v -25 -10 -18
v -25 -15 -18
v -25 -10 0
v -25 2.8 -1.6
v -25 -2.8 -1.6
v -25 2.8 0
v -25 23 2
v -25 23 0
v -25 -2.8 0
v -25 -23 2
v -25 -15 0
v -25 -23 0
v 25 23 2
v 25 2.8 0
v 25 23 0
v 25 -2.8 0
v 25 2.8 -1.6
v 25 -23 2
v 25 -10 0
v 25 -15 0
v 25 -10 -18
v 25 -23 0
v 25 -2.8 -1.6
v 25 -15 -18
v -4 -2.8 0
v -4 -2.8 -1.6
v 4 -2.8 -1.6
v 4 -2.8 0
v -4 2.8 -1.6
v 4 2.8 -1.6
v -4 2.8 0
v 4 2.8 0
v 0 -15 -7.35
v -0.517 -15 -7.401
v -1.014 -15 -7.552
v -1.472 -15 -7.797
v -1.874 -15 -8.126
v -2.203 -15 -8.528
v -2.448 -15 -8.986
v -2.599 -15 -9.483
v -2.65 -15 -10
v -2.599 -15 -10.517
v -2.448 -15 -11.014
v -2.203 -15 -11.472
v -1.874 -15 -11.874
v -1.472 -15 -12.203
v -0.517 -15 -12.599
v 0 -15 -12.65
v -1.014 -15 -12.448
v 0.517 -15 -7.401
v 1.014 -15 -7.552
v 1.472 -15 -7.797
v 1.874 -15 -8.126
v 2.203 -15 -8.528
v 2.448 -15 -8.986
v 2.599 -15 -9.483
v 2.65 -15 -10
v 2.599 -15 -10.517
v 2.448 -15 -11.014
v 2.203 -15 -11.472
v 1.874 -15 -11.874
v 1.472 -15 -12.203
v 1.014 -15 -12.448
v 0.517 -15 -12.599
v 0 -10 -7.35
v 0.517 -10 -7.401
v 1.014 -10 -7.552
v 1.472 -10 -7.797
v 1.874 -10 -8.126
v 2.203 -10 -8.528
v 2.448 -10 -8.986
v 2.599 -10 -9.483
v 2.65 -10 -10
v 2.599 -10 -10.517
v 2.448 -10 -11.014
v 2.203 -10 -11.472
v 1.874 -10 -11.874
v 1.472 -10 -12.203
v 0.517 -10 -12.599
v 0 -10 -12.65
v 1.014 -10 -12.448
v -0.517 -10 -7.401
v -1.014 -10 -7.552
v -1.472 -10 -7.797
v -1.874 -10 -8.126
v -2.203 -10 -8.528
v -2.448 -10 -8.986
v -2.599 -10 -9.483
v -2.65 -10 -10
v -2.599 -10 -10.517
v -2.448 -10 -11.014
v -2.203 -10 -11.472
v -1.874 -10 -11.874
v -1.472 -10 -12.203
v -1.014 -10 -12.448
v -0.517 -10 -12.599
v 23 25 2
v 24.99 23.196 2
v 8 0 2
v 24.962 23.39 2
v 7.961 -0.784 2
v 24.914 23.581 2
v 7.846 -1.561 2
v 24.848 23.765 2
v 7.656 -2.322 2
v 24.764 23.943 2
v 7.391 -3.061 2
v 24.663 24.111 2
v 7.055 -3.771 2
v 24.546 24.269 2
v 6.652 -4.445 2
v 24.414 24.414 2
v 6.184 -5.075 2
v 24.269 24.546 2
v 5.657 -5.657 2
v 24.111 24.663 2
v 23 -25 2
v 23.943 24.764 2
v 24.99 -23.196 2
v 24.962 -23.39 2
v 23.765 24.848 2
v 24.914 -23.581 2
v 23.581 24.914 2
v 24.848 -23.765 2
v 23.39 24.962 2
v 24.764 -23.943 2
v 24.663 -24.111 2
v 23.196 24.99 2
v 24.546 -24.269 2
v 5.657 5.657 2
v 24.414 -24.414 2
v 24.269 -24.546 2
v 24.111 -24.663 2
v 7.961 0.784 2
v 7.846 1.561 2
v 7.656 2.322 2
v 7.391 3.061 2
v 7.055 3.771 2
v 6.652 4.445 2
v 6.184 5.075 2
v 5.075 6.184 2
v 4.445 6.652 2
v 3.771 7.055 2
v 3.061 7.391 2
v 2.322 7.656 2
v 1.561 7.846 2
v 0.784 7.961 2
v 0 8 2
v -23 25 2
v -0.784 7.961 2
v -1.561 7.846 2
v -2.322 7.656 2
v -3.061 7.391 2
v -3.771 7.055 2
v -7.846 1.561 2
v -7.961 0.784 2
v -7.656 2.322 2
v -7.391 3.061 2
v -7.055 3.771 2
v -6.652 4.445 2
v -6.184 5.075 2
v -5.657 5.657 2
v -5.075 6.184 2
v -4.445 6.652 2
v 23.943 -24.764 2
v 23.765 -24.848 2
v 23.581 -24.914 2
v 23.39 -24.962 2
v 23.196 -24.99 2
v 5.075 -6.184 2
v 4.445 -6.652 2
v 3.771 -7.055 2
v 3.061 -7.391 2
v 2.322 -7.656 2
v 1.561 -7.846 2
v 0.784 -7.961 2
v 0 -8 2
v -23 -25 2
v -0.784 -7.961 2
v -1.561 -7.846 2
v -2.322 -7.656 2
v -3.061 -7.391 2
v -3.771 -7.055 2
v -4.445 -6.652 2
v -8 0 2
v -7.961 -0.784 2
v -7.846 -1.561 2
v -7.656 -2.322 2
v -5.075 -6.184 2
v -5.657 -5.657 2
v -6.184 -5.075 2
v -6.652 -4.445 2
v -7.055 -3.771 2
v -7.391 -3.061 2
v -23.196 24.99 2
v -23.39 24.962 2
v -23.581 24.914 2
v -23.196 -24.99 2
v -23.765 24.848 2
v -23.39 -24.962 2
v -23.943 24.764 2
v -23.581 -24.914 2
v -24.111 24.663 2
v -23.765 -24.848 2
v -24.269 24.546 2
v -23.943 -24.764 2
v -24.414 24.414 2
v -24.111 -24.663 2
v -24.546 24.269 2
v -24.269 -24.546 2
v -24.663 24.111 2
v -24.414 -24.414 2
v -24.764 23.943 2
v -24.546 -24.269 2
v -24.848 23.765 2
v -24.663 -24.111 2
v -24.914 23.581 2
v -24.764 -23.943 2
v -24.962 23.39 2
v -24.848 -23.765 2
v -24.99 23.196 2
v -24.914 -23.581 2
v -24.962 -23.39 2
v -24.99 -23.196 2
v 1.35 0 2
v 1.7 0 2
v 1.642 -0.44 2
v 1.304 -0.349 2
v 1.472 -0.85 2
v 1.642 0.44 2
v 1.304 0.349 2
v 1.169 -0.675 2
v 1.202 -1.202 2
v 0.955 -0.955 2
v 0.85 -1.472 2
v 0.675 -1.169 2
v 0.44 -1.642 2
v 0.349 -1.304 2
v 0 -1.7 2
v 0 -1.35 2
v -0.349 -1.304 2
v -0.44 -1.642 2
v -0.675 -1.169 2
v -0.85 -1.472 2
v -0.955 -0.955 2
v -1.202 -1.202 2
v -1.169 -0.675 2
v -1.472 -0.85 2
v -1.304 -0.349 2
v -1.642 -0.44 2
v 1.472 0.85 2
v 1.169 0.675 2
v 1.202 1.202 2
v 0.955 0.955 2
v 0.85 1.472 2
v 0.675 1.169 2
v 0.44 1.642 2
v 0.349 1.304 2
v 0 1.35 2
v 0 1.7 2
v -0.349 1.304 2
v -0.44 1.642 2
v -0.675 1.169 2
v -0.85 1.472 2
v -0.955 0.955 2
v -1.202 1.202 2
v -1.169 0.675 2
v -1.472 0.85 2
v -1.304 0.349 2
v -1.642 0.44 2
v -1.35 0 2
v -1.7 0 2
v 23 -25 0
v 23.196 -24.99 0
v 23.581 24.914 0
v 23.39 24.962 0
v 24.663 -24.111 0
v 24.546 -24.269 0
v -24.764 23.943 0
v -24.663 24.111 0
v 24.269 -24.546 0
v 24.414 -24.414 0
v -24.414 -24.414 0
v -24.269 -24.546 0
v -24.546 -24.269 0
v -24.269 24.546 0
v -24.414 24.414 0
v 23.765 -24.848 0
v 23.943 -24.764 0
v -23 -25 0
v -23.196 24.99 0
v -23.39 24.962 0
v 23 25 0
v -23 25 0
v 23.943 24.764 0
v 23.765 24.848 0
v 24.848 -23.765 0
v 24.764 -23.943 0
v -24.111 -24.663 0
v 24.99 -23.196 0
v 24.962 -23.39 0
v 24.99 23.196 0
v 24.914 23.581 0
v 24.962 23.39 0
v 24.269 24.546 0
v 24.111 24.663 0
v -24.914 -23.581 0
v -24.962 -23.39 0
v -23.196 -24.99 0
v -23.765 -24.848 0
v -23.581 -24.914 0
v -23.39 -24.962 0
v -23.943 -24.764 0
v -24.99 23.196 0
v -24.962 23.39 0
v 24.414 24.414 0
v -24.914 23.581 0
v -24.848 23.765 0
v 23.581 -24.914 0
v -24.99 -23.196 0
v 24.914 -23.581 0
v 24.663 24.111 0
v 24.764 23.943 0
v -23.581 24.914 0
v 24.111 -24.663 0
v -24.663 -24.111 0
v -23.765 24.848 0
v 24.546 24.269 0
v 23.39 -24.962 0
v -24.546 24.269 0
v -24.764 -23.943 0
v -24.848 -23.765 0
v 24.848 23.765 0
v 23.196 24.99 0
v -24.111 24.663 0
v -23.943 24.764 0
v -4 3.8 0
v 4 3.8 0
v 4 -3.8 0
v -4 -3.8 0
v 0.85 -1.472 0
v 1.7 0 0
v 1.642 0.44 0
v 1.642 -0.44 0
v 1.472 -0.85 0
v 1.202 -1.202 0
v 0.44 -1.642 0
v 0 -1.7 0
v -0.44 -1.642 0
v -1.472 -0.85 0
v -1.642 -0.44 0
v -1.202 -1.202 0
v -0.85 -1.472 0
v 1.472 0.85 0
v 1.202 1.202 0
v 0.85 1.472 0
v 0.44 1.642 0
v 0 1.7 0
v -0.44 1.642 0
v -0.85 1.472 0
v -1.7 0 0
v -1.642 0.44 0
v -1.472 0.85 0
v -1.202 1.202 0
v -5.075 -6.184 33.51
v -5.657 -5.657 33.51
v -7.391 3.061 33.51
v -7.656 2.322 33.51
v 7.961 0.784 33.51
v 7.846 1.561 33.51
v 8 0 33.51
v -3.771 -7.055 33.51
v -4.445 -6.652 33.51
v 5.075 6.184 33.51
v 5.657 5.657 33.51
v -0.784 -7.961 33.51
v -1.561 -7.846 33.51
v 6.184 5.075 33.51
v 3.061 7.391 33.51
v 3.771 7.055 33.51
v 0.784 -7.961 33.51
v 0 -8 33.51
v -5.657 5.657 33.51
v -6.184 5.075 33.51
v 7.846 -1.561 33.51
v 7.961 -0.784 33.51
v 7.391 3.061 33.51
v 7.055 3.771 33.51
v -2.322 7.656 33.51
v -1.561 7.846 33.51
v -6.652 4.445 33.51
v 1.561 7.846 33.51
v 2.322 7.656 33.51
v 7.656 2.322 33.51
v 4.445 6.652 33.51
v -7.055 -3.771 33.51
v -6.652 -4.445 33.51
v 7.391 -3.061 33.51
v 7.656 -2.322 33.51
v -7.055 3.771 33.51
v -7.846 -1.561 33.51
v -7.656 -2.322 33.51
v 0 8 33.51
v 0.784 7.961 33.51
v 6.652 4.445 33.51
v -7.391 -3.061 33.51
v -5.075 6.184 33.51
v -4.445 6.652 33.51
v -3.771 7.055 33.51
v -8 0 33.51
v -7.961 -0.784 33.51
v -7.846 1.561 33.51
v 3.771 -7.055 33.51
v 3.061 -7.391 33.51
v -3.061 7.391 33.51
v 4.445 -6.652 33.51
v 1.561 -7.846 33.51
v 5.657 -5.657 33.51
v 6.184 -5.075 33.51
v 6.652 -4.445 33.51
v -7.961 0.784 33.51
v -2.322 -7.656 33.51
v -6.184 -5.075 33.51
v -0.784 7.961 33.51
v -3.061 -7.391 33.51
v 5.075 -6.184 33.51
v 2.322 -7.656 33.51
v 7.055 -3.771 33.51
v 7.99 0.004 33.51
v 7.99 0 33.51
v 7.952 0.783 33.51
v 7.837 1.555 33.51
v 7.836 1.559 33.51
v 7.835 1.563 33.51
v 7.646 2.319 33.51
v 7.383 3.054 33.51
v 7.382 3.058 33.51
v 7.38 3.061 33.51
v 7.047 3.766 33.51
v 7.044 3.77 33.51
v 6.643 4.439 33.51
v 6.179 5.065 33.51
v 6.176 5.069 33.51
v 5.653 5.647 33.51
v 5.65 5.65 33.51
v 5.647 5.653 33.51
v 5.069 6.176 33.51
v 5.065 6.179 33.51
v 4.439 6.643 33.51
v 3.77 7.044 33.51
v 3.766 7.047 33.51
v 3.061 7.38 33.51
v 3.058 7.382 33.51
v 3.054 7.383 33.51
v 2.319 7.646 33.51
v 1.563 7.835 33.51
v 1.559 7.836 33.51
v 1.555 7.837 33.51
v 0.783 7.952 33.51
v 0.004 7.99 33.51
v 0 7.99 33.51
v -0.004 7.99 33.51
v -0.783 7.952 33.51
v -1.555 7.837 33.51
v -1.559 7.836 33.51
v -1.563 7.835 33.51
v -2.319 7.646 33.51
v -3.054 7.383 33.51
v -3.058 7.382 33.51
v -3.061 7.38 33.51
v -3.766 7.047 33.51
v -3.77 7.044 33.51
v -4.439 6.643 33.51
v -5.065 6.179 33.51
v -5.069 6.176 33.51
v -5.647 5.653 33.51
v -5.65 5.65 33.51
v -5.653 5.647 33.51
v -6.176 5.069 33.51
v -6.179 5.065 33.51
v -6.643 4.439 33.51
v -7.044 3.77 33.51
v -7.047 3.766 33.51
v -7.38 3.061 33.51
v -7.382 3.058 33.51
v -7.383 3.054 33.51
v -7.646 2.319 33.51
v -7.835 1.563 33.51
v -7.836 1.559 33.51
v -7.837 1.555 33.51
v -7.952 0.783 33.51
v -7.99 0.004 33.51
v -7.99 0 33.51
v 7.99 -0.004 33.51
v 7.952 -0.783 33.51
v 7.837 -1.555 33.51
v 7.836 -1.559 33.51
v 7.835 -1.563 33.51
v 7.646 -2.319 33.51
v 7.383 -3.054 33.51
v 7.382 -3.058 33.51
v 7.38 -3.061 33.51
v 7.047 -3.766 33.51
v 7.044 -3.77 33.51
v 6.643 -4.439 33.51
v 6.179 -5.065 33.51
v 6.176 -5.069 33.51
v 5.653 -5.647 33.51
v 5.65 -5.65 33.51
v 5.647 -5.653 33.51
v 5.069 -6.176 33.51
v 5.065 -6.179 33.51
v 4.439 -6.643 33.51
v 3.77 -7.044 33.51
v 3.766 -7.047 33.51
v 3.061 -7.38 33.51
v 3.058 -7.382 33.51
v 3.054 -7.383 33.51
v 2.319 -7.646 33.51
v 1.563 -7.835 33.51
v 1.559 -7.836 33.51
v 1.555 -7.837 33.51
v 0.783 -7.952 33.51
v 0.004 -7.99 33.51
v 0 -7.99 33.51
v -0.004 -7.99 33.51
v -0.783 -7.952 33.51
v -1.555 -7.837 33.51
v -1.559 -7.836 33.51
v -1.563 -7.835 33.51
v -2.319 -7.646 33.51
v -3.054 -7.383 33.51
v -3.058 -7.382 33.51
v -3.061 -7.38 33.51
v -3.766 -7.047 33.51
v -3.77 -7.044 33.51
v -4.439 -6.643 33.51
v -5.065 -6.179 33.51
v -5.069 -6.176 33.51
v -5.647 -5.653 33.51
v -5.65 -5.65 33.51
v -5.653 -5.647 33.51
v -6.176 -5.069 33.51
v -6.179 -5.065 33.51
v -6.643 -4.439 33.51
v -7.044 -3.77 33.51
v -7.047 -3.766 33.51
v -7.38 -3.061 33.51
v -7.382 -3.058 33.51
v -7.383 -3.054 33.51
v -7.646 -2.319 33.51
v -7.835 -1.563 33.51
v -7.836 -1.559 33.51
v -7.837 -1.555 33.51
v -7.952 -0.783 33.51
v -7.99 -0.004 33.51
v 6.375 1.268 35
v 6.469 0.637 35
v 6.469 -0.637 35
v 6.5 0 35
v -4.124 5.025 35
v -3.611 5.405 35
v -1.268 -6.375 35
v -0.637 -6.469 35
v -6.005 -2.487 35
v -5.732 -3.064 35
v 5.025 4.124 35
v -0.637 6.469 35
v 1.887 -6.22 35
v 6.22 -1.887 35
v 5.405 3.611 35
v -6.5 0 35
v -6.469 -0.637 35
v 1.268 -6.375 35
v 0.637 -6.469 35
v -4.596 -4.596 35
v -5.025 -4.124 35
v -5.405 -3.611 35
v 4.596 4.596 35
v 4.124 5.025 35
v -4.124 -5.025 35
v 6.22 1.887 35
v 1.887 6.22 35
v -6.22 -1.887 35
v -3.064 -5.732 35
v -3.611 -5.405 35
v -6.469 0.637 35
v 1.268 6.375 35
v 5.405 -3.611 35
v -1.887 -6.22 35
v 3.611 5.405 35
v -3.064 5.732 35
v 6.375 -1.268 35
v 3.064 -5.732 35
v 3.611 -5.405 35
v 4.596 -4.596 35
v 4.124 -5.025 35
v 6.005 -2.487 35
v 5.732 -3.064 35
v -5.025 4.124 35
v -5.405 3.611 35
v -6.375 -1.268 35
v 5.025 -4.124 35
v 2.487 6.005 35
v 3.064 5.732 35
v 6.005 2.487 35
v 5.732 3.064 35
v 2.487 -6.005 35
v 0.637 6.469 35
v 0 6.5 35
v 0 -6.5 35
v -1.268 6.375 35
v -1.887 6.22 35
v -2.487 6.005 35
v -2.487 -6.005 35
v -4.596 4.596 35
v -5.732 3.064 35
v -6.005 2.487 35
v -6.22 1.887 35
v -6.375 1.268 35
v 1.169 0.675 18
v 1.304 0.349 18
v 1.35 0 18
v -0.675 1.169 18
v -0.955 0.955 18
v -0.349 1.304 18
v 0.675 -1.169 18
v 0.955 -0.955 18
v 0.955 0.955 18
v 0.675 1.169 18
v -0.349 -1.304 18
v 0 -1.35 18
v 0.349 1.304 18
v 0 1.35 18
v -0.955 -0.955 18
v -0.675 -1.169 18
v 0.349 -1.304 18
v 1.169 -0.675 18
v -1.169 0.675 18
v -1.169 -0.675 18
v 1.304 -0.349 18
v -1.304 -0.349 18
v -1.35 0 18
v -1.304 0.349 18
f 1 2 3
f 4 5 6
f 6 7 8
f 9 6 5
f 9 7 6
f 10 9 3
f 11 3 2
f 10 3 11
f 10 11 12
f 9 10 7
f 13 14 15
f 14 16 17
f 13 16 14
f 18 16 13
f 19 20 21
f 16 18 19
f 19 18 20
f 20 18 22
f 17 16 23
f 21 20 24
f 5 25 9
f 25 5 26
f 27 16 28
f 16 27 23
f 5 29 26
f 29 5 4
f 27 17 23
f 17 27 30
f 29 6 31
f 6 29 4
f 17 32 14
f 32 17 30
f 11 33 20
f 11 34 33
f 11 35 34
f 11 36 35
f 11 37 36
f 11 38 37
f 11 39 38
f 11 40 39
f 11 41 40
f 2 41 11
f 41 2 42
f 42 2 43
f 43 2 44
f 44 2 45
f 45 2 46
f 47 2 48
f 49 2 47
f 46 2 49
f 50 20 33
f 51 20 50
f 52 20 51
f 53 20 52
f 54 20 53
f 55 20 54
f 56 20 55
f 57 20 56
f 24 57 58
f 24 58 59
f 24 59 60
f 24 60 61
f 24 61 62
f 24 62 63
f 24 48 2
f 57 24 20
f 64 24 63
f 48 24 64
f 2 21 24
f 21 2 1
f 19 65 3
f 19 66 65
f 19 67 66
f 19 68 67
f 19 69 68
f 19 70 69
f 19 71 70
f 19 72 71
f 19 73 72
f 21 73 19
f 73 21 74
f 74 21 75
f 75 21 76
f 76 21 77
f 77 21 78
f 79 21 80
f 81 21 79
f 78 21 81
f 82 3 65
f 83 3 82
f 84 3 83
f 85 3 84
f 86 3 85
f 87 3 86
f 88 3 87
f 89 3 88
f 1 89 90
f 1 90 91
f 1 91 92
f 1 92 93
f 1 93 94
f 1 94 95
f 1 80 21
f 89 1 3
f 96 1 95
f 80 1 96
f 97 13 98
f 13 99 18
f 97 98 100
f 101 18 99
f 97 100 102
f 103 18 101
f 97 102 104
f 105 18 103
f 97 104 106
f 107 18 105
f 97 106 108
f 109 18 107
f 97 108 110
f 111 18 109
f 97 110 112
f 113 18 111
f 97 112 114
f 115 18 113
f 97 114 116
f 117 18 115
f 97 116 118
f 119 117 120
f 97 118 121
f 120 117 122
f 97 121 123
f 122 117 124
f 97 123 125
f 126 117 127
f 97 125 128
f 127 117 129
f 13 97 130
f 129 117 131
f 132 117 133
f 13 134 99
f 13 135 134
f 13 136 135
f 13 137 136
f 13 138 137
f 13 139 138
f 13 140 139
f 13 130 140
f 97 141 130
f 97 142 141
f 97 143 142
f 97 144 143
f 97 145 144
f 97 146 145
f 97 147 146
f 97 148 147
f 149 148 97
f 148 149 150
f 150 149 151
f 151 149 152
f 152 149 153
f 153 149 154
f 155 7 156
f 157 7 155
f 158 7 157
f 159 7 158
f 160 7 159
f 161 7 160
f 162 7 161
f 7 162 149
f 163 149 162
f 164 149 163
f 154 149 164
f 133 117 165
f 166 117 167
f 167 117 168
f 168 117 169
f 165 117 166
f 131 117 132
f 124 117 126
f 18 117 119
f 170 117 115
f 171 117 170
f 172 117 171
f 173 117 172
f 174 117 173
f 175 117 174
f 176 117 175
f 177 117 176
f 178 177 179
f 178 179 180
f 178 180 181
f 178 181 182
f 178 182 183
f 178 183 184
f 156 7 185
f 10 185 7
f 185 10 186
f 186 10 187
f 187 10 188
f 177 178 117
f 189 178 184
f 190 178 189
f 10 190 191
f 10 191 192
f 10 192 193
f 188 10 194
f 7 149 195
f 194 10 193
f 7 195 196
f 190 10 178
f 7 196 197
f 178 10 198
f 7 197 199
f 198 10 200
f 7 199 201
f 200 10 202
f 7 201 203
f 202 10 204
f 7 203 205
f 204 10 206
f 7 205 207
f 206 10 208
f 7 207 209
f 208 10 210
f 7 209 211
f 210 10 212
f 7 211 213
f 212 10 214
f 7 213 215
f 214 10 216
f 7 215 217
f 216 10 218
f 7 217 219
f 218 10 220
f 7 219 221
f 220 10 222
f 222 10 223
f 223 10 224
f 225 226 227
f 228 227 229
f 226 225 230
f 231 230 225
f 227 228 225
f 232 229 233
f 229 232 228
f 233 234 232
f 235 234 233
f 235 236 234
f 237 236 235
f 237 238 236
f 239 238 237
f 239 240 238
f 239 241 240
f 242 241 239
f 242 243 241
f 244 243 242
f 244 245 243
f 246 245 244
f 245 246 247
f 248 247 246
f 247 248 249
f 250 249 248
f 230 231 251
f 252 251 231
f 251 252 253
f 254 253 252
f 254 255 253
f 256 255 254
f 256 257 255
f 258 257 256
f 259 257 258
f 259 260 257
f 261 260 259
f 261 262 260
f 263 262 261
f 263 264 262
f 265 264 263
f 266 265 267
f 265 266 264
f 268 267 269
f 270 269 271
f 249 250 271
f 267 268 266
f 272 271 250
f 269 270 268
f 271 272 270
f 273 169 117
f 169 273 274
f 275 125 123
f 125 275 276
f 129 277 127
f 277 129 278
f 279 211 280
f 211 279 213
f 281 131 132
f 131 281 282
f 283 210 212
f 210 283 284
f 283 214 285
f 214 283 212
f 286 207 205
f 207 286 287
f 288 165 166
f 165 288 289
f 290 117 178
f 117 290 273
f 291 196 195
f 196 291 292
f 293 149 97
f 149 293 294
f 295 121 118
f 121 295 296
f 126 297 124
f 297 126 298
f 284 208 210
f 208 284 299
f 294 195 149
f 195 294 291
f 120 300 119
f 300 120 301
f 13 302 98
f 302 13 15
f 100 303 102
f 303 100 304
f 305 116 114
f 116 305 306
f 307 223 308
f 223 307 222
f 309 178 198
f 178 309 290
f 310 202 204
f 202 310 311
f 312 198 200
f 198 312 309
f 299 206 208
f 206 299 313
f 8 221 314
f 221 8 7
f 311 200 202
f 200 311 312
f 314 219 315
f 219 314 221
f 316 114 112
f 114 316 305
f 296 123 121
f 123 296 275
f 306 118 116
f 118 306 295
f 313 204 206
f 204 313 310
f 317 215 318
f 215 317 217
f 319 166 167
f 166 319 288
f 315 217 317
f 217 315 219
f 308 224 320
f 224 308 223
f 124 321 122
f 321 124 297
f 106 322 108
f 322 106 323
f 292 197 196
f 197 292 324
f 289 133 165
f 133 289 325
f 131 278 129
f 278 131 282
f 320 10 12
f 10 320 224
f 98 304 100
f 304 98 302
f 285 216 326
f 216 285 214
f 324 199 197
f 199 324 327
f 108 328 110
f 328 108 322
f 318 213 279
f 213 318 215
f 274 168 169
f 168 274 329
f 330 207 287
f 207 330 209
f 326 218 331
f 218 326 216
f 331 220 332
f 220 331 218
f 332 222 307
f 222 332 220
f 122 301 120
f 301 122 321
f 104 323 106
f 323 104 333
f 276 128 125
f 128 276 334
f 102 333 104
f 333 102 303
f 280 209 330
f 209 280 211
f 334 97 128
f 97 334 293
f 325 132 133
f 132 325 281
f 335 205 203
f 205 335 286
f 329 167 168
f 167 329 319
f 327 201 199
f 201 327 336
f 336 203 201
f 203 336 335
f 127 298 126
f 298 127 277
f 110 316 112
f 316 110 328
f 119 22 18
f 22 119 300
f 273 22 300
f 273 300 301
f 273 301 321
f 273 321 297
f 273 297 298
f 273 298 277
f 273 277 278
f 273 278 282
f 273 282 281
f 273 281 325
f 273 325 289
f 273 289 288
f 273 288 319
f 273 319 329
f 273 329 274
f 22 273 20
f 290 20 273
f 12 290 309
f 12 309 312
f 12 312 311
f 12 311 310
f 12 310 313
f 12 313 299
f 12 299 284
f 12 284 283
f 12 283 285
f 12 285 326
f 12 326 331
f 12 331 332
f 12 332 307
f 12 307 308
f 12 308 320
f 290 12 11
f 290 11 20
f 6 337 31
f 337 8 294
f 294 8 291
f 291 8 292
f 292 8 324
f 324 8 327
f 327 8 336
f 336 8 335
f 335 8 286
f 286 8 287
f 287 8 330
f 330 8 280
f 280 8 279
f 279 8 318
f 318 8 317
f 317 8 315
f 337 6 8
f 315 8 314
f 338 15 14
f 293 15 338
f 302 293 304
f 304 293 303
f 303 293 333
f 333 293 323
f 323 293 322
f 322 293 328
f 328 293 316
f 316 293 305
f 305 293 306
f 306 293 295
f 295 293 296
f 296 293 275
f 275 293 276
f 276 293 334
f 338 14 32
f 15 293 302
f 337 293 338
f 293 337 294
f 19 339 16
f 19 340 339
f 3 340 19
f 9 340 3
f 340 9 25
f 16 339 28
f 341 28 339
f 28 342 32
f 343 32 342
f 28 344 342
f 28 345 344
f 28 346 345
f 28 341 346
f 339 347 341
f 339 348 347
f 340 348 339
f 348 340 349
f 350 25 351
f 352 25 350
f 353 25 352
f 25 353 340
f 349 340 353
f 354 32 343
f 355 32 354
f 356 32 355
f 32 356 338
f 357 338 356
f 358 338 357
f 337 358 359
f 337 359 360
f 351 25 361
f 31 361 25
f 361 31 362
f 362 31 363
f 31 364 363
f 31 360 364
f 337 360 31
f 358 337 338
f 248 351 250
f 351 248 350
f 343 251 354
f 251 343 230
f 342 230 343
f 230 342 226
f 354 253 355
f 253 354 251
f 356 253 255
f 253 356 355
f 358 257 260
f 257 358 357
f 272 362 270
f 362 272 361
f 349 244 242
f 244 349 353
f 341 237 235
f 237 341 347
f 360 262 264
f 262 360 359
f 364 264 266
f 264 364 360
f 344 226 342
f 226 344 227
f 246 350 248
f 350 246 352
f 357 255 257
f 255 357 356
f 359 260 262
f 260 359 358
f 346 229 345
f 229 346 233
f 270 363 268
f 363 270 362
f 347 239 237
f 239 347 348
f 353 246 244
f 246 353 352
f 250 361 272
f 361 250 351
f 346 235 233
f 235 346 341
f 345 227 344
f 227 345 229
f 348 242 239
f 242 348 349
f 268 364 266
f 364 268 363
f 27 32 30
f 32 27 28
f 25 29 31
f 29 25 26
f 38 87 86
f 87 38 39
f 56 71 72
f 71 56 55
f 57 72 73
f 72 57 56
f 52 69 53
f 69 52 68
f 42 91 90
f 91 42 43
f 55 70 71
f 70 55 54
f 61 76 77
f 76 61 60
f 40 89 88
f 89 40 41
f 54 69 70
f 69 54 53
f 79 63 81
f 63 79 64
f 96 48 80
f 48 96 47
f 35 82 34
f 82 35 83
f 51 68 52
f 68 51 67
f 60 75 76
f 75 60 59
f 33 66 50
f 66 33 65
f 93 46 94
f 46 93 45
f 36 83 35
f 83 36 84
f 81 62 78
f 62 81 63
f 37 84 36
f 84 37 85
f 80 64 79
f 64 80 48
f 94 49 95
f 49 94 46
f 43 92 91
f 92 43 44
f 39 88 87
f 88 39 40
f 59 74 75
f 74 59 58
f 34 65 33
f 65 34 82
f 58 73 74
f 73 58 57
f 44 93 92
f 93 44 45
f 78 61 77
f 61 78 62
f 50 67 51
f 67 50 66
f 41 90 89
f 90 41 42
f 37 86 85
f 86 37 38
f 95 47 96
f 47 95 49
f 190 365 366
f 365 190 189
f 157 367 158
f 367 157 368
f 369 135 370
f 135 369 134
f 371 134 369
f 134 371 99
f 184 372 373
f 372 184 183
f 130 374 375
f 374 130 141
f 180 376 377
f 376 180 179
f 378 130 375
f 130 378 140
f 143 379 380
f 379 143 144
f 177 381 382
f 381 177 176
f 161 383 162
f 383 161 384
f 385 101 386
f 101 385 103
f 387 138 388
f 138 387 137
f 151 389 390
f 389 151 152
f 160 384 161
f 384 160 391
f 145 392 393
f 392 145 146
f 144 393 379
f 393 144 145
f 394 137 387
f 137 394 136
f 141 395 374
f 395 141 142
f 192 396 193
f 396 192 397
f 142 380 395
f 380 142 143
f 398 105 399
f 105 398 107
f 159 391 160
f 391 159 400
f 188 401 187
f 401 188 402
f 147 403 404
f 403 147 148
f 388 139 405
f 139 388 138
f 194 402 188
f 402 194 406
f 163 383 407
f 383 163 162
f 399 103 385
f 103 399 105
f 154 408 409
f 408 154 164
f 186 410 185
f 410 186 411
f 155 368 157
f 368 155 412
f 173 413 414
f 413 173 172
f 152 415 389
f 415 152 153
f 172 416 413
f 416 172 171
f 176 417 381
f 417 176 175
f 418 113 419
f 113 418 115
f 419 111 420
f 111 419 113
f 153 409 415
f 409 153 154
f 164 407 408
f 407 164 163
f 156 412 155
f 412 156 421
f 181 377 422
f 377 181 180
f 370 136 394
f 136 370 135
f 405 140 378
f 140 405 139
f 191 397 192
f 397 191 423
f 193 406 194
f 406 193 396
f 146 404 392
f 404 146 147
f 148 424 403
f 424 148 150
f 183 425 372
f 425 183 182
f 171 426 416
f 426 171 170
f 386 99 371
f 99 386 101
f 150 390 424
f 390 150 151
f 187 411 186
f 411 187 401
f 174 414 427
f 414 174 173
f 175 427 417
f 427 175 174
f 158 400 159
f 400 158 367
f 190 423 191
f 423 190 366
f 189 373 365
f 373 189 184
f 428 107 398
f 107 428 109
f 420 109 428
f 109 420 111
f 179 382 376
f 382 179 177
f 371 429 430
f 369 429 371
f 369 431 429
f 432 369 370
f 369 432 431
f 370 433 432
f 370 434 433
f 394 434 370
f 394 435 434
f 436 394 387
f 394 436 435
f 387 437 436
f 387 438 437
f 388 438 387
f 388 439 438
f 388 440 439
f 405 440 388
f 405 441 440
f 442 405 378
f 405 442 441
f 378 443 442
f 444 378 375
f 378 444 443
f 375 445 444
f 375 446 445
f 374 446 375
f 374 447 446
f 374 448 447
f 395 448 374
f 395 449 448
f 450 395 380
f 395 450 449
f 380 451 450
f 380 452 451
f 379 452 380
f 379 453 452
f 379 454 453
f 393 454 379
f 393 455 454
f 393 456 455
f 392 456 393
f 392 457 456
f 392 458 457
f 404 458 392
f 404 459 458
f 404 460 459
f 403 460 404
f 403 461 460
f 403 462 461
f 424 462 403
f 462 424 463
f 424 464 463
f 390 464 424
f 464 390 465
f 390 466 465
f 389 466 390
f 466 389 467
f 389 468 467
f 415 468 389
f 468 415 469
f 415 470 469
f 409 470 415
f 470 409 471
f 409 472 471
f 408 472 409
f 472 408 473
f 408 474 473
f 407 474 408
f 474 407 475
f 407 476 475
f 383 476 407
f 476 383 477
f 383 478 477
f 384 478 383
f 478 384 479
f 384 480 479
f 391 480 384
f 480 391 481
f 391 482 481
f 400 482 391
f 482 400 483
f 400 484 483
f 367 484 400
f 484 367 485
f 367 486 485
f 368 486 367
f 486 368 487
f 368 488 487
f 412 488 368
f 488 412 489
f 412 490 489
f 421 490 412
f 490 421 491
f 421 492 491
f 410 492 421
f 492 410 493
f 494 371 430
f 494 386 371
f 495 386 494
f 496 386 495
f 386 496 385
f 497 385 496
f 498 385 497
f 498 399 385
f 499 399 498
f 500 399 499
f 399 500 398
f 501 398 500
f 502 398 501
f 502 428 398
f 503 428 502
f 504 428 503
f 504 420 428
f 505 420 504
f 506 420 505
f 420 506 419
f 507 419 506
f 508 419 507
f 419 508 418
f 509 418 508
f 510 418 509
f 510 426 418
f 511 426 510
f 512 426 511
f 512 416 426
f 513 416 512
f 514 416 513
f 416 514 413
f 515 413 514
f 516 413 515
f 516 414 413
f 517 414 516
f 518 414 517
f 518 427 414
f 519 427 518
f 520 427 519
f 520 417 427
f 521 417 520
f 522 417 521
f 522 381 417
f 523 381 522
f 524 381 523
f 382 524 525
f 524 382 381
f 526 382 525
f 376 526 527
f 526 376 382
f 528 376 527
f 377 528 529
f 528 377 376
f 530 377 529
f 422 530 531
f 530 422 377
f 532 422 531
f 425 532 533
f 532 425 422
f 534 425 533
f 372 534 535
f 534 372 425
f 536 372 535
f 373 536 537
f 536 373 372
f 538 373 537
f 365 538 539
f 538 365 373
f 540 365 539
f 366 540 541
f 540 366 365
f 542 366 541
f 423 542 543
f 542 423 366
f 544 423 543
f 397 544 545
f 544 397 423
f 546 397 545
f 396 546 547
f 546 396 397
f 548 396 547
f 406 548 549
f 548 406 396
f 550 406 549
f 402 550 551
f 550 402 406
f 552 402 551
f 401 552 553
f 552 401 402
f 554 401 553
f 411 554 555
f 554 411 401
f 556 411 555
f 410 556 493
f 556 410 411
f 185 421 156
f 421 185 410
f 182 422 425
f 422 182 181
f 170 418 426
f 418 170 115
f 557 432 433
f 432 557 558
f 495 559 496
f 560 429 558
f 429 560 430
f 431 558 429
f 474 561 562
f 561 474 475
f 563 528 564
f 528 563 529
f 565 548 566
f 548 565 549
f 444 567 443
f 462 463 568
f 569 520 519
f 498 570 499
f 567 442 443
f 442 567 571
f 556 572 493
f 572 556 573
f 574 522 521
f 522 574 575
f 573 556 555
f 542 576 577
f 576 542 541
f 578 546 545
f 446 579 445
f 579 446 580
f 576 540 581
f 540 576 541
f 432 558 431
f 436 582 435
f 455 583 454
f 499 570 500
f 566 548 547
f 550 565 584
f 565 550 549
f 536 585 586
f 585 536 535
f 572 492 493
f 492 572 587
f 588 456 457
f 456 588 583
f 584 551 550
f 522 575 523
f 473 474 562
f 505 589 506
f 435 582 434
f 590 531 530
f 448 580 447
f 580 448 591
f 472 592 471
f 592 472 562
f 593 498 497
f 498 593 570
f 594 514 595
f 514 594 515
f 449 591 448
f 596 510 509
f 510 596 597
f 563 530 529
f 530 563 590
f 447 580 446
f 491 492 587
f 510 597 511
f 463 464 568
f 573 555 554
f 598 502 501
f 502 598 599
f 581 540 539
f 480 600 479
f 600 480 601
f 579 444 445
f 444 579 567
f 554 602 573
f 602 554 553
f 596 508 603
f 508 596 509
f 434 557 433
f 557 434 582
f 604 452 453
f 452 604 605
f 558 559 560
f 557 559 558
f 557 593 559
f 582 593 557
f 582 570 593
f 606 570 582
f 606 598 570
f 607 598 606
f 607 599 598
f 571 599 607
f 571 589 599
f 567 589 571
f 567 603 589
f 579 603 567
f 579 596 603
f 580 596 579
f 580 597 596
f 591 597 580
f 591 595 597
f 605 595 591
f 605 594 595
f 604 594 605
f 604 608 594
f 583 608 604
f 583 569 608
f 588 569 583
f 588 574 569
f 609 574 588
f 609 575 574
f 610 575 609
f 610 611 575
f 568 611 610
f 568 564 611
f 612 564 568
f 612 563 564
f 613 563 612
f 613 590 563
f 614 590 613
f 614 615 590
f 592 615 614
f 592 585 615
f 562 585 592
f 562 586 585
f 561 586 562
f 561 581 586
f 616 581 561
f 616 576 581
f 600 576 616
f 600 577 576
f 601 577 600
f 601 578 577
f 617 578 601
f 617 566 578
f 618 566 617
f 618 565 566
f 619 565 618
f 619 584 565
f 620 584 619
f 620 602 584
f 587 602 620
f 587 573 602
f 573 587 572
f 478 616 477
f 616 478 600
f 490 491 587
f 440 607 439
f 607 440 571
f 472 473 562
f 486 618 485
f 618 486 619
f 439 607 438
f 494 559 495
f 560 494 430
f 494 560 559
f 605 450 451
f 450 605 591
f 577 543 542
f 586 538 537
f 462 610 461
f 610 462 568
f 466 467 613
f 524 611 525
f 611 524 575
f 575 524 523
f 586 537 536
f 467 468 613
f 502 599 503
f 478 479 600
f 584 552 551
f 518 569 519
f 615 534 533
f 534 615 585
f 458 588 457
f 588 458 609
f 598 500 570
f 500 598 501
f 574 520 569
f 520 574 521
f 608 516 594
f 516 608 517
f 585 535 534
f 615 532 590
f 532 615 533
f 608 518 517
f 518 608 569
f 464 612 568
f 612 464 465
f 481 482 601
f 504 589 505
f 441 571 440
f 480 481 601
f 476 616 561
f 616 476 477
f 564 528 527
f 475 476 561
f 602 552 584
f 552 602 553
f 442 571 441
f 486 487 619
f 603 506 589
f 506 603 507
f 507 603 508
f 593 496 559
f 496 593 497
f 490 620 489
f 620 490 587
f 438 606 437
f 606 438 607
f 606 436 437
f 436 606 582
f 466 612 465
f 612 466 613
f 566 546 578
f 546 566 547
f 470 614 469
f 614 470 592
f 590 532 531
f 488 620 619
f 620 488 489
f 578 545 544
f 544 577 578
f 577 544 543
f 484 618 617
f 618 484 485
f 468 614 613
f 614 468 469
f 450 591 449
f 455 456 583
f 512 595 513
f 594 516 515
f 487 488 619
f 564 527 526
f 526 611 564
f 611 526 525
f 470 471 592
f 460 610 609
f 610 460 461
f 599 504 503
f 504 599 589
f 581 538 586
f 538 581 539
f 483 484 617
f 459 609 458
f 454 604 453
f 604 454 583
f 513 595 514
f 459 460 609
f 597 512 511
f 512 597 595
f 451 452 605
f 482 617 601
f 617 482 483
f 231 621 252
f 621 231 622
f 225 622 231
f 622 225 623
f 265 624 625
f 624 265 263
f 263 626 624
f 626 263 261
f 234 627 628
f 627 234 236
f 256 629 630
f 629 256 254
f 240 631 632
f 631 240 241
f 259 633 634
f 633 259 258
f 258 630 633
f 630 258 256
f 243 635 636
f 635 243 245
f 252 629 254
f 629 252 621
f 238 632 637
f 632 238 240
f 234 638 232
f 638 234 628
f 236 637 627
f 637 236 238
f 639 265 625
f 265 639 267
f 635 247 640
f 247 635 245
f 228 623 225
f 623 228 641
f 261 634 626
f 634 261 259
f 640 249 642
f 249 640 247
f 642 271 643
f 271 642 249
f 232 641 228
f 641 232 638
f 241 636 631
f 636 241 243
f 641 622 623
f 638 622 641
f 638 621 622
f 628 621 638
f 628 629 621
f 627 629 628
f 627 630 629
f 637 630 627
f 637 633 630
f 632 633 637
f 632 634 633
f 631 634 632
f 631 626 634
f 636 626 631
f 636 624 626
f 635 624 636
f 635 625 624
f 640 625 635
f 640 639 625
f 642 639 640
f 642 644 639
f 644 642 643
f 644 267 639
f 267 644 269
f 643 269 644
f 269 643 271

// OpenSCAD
// Washer holder: a place on the V base for the spare 50 x 50 washers (Matt,
// 2026-09-27). A 50 x 50 x 2 plate on top of one of the base's 2020 rails,
// centred over it, with a post for the washers' M16 hole and a leg down the
// rail's side face, M5 x 10 into a drop-in tee nut. The leg runs down from
// under the plate, 10 off its centre, where the rail's side face is. It is
// v-base.scad's angle bracket with a wider pad: the same 5 mm leg, the same
// rib in the top slot's opening to square it. The spares are ballast too,
// wherever on the base they sit.
//
// The plate overhangs the rail 15 a side and is only 2 thick. The washers are
// 5 mm of steel and sit on the rail through it, so the overhang carries
// nothing.
//
// It cannot print in one piece without support: the post goes up from the
// plate and the leg goes down. So two parts (part = bracket | post):
//   bracket - plate, rib and leg. Printed upside down, plate's top on the
//             bed, leg and rib standing. No support.
//   post    - printed as it stands.
// One M3 x 16 cap head up through the plate into a pilot in the post. Its
// head hangs under the plate in the rail's top slot, 5.5 in the 6.0 opening,
// and the rib is cut away round it. The post only locates the washers, so
// the screw carries nothing either. Fit the post before the bracket goes on
// the rail.
//
// part = "whole" is the one piece, no M3. It prints standing on its end, the
// post level, and wants support under the post.
part        = "pair";  // [pair, bracket, post, whole]
rail        = 20;
plate       = [50, 50, 2];   // along the rail, across it, thick
corner_r    = 2;
spares      = 6;       // washers the post holds
washer      = [50, 50, 5];   // load-stack.scad's
post_d      = 16;      // the washers' hole is 17.5 to 18; the stack's M16 bolt is the same 16
post_over   = 3;       // post above a full stack
post_c      = 1.5;     // chamfer at its top
leg_t       = 5;
leg_short   = 2;       // leg stops this far above the desk
m5_clear    = 5.3;
rib_w       = 5.6;     // into the slot's 6.0 opening
rib_h       = 1.6;     // under a 1.8 lip
m3_clear    = 3.4;
m3_pilot    = 2.7;     // self-tapping, as the pulley cap's axle
m3_len      = 16;
m3_head     = 5.5;
rib_gap     = 8;       // rib cut away round the M3's head
print_flip  = false;   // bracket: upside down. whole: standing on its end
show_context = false;  // rail stub, washers and the M5; preview only
$fn = 64;

split   = part != "whole";
post_h  = spares*washer[2] + post_over;
m3_grip = m3_len - plate[2];

assert(m3_head < 6.0, "M3 head wider than the slot's opening");
assert(m3_grip + 2 < post_h, "M3 through the post's top");
assert(post_d/2 + corner_r < plate[1]/2, "post off the plate");
echo(str("holder: plate ", plate, " on the rail, leg ", leg_t, " x ", rail - leg_short, " down, M5 x 10 leaves ", 10 - leg_t,
         " for the tee nut; post ", post_d, " x ", post_h, " for ", spares, " washers, ", spares*86/1000, " kg",
         split ? str("; M3 x ", m3_len, " taps ", m3_grip, " of the post") : "; one piece"));

// Rail along X, its top face at z = 0, the leg on its side face at y = -rail/2.
module plate_2d() { offset(r=corner_r) square([plate[0] - 2*corner_r, plate[1] - 2*corner_r], center=true); }
module under_profile() {   // YZ: rib and leg, hanging from z = 0
    translate([-rib_w/2, -rib_h]) square([rib_w, rib_h + 0.01]);
    translate([-rail/2 - leg_t, -rail + leg_short]) square([leg_t, rail - leg_short + 0.01]);
}
module bracket() {
    difference() {
        union() {
            linear_extrude(plate[2]) plate_2d();
            intersection() {
                translate([-plate[0]/2, 0, 0]) rotate([90,0,90]) linear_extrude(plate[0]) under_profile();
                // the leg's and rib's ends follow the plate's corners
                translate([0, 0, -rail]) linear_extrude(rail + 1) plate_2d();
            }
        }
        translate([0, -rail/2 + 1, -rail/2]) rotate([90,0,0]) cylinder(h=leg_t + 2, d=m5_clear, $fn=32);
        if(split) {
            translate([0, 0, -rib_h - 1]) cylinder(h=rib_h + plate[2] + 2, d=m3_clear, $fn=24);
            translate([-rib_gap/2, -rib_w/2 - 1, -rib_h - 1]) cube([rib_gap, rib_w + 2, rib_h + 1]);
        }
    }
}
module post() {   // standing on z = 0
    difference() {
        union() {
            cylinder(h=post_h - post_c + 0.01, d=post_d);
            translate([0, 0, post_h - post_c]) cylinder(h=post_c, d1=post_d, d2=post_d - 2*post_c);
        }
        if(split) translate([0, 0, -1]) cylinder(h=m3_grip + 3, d=m3_pilot, $fn=24);
    }
}
module whole() { bracket(); translate([0, 0, plate[2] - 0.01]) post(); }

if(part == "bracket") { if(print_flip) translate([0, 0, plate[2]]) rotate([180,0,0]) bracket(); else bracket(); }
if(part == "post")    post();
if(part == "whole")   { if(print_flip) translate([0, 0, plate[0]/2]) rotate([0,-90,0]) whole(); else whole(); }
if(part == "pair")    { bracket(); translate([0, 0, plate[2]]) post(); }

if(show_context && !print_flip) %union() {
    color([0.66,0.71,0.75]) translate([-60, -rail/2, -rail]) difference() {
        cube([120, rail, rail]);
        for(s=[[rail/2, rail], [0, rail/2], [rail, rail/2], [rail/2, 0]])
            translate([-1, s[0], s[1]]) rotate([0,90,0]) linear_extrude(122) square(6, center=true);
    }
    if(part != "post") color([0.55,0.57,0.6]) for(i=[0:spares-1]) translate([0, 0, plate[2] + i*washer[2]]) difference() {
        translate([-washer[0]/2, -washer[1]/2, 0]) cube([washer[0], washer[1], washer[2] - 0.2]);
        translate([0,0,-1]) cylinder(h=washer[2] + 2, d=18);
    }
    color([0.2,0.2,0.2]) translate([0, -rail/2 - leg_t, -rail/2]) rotate([90,0,0]) cylinder(h=2.75, d=9.26, $fn=24);
}
